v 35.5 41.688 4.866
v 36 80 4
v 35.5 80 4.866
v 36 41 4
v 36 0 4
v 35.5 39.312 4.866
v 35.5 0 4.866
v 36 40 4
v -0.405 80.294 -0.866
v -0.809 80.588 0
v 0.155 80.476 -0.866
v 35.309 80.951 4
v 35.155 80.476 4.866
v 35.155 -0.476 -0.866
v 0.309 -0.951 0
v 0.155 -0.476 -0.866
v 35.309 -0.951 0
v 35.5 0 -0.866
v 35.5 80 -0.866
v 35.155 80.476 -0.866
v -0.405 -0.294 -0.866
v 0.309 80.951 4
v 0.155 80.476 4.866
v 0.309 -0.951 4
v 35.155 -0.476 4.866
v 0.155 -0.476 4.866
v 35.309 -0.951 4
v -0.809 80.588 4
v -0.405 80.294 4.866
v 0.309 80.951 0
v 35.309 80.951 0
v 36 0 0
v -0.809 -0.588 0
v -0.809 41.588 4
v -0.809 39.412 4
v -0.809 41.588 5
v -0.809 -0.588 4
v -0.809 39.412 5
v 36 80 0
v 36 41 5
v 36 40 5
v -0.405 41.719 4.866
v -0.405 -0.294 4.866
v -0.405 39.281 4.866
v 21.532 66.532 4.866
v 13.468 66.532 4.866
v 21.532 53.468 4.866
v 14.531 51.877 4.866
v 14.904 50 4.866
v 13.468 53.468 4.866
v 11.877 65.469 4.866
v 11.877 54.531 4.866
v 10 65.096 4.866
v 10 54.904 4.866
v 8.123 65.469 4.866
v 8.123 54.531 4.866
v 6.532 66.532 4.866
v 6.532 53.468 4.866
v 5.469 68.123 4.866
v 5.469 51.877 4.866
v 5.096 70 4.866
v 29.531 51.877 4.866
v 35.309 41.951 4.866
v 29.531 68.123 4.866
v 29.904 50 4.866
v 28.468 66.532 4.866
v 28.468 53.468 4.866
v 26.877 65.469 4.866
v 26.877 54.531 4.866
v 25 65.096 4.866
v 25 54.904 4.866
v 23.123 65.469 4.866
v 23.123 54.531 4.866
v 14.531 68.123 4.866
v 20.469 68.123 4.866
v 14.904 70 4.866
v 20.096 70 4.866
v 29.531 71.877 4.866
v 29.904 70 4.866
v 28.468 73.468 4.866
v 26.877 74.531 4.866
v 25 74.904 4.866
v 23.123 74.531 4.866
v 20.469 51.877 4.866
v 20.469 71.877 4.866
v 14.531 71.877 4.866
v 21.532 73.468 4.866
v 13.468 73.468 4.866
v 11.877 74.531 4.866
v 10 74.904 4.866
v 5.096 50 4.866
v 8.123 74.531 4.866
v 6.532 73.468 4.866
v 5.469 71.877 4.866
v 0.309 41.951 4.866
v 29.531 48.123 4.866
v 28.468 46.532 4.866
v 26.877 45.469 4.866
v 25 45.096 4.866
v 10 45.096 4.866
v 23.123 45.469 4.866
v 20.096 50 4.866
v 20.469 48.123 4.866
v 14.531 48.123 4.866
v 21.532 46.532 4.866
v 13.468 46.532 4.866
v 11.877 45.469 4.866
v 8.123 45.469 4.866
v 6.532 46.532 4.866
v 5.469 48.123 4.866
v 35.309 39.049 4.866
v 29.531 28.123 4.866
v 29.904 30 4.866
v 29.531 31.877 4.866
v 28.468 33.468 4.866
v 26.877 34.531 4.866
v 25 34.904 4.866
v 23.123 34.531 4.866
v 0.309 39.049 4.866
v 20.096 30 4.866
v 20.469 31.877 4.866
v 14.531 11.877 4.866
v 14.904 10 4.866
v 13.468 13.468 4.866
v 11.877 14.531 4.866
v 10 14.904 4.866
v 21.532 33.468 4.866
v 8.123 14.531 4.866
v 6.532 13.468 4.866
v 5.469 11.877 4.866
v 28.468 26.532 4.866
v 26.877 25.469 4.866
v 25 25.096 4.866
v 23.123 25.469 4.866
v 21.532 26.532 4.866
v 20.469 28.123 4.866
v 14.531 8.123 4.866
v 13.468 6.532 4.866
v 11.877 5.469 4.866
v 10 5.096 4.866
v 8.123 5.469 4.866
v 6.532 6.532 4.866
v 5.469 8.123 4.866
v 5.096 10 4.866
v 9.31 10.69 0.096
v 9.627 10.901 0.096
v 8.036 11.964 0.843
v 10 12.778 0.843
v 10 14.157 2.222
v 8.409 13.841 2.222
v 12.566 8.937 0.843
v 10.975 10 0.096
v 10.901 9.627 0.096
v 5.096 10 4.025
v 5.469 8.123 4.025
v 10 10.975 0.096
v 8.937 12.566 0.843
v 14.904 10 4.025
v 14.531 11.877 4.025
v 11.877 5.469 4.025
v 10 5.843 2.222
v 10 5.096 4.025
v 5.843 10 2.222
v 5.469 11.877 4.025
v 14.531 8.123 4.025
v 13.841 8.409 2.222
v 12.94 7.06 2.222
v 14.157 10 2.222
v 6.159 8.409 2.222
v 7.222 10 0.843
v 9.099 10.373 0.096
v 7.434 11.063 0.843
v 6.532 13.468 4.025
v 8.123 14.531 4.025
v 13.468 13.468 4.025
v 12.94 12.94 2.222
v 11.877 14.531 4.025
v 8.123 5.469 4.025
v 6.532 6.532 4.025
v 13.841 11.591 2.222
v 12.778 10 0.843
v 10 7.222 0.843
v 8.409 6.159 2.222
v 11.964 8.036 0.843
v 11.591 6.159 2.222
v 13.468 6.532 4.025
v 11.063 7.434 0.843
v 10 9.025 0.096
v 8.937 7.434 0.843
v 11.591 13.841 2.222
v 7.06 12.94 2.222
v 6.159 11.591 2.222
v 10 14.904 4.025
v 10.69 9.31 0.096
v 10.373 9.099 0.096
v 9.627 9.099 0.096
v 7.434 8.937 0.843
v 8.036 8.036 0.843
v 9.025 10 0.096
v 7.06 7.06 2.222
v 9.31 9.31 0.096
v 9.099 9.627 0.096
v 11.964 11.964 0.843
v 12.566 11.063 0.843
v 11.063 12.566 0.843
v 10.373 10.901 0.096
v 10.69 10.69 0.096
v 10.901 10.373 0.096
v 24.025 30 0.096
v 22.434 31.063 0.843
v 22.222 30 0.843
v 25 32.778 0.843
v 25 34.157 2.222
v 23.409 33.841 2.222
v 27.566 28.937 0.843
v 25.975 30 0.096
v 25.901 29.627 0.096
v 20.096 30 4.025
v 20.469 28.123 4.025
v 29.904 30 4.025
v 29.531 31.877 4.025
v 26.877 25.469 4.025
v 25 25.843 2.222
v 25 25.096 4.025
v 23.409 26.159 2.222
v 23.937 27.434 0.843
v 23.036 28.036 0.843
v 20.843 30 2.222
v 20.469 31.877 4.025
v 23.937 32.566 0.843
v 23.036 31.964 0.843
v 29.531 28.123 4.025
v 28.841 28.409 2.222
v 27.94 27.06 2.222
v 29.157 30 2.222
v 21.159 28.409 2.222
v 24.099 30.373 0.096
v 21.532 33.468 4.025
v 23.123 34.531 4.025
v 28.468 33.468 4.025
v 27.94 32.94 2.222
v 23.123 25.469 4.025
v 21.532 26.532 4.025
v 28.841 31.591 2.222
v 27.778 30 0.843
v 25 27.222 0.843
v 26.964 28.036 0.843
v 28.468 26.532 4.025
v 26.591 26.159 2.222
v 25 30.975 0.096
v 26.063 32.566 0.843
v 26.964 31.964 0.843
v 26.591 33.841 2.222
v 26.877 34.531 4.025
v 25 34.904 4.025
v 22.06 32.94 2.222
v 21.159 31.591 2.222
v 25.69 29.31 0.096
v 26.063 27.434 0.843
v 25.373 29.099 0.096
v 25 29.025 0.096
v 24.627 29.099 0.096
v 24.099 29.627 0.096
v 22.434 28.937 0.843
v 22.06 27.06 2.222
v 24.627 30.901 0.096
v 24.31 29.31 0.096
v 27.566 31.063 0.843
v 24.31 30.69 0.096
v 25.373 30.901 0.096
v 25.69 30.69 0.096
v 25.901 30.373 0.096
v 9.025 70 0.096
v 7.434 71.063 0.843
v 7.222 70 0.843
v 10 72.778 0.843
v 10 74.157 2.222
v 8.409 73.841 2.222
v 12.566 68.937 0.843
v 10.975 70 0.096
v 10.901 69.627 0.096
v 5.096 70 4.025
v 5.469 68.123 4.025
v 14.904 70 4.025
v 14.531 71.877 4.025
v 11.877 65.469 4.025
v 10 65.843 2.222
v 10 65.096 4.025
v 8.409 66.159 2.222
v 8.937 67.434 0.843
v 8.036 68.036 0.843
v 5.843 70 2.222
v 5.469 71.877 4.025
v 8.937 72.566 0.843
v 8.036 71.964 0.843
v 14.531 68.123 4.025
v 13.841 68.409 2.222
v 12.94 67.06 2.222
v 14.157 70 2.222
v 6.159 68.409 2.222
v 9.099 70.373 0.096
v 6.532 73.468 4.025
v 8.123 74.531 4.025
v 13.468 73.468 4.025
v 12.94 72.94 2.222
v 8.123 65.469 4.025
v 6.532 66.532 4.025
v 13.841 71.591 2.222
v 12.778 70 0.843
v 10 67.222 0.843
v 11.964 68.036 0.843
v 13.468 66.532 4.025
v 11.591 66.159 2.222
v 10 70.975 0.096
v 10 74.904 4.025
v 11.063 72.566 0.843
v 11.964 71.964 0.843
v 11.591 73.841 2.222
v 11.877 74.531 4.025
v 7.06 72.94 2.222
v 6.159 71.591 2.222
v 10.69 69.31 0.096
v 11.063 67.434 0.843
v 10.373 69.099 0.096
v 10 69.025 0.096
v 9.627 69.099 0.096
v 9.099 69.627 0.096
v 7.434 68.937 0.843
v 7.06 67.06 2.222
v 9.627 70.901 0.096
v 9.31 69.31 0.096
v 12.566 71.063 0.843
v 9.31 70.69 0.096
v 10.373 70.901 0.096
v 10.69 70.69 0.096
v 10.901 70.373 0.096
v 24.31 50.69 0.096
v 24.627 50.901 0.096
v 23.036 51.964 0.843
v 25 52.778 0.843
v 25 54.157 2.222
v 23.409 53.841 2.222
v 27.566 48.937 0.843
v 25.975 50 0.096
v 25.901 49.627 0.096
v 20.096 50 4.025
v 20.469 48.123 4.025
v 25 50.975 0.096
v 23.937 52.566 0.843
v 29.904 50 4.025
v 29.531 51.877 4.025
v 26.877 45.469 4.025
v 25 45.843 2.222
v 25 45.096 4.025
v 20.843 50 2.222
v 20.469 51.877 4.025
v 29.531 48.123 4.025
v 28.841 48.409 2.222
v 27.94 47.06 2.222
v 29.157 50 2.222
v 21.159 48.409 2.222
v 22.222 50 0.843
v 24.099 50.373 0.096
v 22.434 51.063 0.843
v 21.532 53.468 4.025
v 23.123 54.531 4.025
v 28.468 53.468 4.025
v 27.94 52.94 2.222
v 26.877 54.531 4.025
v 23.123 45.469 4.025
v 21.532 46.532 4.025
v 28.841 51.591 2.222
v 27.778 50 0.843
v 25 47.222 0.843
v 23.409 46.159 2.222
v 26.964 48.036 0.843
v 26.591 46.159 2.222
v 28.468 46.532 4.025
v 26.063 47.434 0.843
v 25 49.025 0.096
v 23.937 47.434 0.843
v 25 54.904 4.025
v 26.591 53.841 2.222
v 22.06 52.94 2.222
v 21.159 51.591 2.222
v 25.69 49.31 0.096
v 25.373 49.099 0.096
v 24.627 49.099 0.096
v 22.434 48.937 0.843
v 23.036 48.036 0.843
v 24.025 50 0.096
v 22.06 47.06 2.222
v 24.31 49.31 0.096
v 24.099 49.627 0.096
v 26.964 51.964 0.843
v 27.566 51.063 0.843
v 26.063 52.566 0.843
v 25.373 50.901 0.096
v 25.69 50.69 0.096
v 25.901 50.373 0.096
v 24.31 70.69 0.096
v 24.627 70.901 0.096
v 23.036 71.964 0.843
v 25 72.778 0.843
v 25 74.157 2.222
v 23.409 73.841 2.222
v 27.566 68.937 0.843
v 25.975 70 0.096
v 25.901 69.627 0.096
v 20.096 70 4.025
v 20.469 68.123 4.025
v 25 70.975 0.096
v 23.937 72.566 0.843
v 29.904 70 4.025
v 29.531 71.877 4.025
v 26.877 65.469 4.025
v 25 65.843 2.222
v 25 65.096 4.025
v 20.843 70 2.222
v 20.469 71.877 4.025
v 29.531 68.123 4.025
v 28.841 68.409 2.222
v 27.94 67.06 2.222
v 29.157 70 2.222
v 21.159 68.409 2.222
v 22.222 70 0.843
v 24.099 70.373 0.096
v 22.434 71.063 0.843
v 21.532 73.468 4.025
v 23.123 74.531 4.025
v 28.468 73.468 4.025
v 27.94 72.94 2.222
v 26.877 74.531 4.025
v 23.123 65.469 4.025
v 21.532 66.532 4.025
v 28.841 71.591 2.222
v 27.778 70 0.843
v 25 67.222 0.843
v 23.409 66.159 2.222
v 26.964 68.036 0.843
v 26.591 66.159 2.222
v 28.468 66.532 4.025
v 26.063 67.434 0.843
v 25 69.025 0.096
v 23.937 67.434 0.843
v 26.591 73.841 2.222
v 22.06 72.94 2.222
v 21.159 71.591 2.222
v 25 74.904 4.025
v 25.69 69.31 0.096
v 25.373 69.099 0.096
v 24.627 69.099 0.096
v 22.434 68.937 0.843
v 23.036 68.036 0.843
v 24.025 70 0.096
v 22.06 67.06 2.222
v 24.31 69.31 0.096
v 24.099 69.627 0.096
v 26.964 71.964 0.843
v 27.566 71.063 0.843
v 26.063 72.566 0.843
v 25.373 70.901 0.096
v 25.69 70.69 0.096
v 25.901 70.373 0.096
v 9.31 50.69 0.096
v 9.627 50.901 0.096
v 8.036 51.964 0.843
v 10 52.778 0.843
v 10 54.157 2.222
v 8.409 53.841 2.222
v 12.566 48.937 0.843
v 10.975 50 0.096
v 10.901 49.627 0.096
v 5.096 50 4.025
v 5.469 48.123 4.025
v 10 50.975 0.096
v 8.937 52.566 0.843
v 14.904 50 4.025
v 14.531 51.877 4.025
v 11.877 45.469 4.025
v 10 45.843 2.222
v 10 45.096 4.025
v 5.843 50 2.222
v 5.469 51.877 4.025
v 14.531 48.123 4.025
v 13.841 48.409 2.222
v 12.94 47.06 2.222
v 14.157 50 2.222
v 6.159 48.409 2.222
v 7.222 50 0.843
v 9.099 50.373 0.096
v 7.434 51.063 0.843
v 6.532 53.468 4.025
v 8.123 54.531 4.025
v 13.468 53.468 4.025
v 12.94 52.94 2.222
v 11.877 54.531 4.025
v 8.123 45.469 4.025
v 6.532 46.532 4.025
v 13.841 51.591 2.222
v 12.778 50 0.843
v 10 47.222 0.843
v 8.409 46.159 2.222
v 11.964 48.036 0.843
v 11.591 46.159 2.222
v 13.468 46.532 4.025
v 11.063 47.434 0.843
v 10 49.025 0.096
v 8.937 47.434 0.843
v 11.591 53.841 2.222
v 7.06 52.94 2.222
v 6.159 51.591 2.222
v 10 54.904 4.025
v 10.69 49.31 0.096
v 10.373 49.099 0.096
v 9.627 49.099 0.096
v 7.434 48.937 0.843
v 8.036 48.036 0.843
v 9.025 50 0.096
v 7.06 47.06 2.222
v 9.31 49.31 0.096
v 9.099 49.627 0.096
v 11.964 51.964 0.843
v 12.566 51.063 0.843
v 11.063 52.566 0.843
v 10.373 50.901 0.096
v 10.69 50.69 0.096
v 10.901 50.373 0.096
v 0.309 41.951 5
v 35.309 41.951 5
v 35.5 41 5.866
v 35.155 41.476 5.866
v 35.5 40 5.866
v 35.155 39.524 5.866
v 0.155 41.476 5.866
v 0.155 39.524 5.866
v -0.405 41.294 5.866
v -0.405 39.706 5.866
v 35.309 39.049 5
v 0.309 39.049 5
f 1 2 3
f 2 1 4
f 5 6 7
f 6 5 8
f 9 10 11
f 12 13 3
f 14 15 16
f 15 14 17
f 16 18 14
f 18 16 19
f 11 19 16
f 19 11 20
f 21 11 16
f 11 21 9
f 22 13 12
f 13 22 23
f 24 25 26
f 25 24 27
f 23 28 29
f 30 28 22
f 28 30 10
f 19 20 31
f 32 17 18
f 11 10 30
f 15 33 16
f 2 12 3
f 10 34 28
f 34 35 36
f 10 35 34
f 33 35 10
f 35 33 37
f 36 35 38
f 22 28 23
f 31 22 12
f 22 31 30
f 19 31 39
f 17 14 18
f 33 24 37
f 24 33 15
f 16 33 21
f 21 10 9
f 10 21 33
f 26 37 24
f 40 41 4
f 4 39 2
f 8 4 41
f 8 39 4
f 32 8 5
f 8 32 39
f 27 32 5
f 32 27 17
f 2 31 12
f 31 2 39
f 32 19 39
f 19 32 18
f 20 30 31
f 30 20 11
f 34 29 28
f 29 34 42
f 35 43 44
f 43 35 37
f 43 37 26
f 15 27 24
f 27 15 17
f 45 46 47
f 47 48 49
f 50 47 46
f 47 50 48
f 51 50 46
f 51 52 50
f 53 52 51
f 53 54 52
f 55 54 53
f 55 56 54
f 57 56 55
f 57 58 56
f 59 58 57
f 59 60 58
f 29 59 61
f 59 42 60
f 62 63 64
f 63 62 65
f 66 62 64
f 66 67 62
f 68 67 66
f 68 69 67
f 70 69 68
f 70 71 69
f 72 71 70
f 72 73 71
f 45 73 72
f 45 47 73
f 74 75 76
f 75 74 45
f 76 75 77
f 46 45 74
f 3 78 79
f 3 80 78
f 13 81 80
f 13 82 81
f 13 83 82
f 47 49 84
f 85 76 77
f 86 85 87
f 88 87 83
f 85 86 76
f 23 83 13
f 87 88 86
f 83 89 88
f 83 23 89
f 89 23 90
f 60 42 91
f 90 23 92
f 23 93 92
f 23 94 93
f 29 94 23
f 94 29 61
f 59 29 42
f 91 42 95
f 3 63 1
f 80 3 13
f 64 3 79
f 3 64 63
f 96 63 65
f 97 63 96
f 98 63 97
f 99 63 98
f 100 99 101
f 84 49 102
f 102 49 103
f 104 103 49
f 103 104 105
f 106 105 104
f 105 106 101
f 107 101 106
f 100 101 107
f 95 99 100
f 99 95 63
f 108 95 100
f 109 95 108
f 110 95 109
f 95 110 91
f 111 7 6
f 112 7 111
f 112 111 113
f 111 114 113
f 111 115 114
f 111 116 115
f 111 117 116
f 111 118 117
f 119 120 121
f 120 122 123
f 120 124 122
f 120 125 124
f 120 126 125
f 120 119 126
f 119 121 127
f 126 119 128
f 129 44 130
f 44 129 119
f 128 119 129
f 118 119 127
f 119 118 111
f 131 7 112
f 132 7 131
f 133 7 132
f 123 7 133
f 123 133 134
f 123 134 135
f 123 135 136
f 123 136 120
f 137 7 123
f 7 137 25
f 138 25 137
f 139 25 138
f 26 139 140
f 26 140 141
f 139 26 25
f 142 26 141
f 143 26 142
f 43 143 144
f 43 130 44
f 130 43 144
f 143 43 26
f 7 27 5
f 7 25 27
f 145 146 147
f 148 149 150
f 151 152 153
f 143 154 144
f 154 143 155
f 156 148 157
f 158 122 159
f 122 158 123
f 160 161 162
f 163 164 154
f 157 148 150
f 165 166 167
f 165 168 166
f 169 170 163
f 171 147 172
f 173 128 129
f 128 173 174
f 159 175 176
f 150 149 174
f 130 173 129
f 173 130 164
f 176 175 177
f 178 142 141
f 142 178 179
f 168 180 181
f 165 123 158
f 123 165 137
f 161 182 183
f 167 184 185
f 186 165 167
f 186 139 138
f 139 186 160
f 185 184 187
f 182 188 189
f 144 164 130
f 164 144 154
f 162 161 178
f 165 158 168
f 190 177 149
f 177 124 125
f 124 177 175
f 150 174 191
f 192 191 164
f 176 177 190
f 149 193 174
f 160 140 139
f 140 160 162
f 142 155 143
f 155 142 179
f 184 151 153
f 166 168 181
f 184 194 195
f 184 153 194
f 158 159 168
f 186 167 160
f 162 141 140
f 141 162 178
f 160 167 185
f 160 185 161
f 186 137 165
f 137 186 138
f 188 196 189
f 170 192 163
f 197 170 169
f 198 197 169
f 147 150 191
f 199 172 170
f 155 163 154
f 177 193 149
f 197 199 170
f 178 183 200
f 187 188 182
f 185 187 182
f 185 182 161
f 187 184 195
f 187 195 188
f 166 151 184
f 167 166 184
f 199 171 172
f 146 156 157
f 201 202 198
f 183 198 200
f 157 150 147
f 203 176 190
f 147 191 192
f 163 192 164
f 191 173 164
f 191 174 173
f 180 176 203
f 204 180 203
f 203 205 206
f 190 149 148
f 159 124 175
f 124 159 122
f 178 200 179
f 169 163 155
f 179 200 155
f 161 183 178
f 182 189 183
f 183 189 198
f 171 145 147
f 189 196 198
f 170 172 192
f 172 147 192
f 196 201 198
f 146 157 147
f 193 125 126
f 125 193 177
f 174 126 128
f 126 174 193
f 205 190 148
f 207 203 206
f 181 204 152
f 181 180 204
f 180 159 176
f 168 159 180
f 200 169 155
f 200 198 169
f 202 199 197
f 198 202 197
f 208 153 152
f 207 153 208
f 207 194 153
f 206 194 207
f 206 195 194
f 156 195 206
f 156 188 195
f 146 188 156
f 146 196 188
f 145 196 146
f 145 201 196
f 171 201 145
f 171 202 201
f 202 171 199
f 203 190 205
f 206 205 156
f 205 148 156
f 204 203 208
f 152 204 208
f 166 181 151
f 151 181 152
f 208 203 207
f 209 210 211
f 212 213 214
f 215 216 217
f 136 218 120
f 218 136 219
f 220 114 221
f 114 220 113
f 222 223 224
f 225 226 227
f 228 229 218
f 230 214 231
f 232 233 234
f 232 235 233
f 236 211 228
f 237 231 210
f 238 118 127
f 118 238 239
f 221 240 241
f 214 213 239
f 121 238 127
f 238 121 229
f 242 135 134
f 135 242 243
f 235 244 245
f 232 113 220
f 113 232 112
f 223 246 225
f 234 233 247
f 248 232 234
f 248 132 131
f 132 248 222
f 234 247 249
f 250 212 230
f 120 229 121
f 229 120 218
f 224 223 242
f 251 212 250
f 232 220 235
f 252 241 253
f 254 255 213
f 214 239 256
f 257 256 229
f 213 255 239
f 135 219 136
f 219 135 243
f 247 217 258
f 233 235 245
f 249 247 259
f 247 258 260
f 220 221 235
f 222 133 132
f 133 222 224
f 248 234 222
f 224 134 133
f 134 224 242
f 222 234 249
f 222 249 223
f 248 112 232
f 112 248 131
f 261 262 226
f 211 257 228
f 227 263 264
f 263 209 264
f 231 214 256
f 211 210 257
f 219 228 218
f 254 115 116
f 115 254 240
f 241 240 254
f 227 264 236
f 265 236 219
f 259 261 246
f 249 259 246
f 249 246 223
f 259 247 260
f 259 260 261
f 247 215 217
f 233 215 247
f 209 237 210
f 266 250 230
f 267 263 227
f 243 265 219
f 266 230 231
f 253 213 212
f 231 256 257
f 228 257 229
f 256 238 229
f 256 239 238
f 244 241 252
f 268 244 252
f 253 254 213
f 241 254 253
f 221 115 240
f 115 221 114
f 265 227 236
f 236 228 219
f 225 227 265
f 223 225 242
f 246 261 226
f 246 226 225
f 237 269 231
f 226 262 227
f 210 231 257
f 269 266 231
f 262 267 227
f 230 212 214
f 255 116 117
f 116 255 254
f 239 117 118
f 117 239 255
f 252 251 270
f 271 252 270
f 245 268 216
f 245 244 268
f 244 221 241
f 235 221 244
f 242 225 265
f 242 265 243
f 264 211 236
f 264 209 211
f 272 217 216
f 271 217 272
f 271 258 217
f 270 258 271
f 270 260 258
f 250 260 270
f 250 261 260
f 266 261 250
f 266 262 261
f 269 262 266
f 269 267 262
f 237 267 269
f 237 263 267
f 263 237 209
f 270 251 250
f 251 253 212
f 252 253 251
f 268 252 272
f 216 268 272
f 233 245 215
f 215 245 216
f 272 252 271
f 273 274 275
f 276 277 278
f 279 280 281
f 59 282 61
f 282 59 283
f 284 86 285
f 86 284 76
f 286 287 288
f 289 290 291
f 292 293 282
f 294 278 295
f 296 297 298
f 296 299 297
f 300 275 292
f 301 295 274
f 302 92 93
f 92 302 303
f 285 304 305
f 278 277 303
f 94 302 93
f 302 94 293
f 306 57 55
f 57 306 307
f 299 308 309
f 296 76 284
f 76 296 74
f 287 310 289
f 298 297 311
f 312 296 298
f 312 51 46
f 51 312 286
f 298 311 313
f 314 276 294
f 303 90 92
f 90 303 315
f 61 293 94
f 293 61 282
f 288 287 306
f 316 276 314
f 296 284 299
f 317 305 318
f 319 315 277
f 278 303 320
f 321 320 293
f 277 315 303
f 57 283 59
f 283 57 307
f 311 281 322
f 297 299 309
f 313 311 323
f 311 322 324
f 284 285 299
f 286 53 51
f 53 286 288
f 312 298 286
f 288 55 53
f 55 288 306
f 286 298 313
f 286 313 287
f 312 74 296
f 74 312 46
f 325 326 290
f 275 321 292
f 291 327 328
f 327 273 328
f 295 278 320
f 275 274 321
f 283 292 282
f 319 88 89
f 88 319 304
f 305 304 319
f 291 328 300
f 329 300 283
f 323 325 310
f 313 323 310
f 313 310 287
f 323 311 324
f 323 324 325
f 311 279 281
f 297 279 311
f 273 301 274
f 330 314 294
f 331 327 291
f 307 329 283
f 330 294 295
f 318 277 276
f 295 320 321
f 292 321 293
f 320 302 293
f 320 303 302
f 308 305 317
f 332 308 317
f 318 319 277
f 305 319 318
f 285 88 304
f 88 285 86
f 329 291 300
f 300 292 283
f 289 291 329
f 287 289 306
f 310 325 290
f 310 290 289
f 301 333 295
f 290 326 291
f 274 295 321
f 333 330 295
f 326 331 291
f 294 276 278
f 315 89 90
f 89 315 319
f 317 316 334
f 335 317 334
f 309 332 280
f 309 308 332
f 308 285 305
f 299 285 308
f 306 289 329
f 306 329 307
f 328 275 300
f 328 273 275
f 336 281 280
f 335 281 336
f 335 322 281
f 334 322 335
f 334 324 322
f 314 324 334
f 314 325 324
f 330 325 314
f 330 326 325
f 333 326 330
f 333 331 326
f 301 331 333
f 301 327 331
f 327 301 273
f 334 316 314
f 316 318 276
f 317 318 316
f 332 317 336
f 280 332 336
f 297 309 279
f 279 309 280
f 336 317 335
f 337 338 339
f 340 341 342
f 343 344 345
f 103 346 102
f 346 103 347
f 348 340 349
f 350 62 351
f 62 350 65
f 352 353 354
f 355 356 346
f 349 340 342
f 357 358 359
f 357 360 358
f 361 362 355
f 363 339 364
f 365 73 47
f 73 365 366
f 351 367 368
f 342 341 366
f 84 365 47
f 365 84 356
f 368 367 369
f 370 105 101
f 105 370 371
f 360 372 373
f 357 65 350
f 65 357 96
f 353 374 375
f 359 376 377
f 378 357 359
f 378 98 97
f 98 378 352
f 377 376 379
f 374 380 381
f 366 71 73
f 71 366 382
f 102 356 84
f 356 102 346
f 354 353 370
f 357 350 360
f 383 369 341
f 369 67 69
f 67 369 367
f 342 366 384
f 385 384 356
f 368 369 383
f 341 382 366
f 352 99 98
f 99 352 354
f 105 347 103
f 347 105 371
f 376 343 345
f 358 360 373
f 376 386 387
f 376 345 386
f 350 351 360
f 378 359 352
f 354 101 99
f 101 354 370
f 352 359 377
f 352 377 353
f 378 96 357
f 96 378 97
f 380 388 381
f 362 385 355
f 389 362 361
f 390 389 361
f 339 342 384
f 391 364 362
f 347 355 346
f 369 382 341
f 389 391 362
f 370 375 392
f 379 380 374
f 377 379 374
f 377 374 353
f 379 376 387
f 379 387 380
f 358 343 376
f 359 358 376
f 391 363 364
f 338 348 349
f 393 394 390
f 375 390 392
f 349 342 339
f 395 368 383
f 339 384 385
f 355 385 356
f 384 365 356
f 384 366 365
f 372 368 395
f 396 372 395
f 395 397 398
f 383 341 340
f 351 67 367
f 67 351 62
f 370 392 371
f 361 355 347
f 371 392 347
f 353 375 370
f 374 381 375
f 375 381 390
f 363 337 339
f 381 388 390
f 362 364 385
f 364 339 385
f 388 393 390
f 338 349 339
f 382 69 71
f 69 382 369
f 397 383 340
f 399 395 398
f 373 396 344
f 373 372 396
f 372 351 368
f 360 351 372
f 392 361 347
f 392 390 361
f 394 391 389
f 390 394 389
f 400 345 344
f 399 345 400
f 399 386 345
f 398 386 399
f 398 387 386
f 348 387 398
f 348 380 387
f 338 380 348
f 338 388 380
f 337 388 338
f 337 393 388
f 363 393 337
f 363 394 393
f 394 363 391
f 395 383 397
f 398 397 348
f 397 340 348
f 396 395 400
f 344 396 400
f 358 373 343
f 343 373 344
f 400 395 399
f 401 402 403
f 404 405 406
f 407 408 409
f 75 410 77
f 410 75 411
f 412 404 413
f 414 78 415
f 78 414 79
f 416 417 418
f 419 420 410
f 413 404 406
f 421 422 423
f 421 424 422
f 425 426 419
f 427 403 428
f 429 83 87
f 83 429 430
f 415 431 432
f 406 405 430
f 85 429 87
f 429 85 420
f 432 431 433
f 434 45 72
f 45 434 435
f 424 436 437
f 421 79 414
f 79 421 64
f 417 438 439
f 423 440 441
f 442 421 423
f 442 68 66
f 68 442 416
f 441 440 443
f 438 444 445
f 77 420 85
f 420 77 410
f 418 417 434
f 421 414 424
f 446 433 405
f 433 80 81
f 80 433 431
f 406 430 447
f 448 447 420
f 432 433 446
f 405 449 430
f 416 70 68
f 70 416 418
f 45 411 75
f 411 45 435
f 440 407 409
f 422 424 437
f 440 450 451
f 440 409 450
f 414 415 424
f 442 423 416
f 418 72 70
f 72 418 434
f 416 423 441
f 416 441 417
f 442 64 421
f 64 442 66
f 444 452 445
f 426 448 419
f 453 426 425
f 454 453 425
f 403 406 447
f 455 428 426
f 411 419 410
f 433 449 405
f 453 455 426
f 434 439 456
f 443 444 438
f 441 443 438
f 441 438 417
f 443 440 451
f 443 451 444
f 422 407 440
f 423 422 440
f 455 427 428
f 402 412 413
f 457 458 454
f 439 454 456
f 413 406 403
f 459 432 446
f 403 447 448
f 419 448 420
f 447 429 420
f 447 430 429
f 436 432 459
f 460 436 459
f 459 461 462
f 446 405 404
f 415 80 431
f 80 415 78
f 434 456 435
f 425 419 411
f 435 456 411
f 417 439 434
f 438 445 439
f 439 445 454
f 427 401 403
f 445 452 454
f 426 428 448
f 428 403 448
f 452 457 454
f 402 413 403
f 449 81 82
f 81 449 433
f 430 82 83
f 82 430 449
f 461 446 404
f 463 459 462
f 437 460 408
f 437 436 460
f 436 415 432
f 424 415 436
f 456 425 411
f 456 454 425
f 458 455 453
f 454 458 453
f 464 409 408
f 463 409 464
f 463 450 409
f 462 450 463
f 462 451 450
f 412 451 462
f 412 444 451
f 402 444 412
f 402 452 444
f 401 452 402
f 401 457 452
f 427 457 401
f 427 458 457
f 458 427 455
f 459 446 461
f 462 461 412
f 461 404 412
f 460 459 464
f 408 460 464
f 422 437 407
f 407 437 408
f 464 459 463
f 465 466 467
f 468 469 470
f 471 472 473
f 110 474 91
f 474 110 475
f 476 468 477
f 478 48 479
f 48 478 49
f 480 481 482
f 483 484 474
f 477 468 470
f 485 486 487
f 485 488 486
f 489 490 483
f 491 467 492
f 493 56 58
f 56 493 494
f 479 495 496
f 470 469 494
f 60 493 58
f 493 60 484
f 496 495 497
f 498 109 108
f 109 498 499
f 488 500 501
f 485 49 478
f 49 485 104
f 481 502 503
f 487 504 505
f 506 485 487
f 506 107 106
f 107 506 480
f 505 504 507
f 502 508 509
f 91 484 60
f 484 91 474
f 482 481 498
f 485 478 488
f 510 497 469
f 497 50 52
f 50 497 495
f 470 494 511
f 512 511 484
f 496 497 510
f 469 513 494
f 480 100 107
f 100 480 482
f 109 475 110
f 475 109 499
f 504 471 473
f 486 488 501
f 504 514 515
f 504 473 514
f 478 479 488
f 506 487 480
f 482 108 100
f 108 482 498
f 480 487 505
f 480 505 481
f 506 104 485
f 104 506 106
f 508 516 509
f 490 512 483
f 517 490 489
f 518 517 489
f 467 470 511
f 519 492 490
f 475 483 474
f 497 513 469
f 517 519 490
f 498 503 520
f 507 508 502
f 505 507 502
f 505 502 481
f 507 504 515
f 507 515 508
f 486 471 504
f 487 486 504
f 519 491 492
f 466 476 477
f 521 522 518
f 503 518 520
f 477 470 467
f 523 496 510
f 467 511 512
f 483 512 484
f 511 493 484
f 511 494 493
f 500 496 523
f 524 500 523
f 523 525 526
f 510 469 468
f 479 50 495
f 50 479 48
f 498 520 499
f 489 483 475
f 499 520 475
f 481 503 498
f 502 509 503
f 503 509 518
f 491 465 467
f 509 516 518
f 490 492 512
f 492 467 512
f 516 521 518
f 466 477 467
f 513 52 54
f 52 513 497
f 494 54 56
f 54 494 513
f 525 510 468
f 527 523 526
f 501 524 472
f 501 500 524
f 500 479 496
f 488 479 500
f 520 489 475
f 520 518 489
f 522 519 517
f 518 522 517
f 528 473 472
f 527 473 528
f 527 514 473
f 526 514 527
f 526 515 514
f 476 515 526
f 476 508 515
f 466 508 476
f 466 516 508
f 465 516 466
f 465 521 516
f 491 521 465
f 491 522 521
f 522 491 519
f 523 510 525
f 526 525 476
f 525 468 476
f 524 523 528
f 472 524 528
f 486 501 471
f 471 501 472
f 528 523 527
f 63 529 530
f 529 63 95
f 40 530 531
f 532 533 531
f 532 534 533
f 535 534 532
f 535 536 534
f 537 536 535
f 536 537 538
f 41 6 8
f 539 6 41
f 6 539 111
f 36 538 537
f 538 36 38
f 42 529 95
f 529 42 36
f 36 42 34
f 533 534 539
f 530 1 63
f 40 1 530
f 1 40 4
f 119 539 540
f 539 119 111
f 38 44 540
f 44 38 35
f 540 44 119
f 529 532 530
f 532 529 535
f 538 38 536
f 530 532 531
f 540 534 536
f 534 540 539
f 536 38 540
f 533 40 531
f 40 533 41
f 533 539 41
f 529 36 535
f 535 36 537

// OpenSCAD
// Loguncov Maxim 13.12.13


//$fn=128;


translate([0,40,0])
minkowski()
{cube([35,1,5]);
sphere(1);
}

difference() {

//основа
minkowski()
{cube([35,80,4]);
sphere(1);
}

//отверстия
translate([10,10,5])sphere(5);
translate([25,30,5])sphere(5);


translate([10,70,5])sphere(5);
translate([25,50,5])sphere(5);
translate([25,70,5])sphere(5);
translate([10,50,5])sphere(5);

}
